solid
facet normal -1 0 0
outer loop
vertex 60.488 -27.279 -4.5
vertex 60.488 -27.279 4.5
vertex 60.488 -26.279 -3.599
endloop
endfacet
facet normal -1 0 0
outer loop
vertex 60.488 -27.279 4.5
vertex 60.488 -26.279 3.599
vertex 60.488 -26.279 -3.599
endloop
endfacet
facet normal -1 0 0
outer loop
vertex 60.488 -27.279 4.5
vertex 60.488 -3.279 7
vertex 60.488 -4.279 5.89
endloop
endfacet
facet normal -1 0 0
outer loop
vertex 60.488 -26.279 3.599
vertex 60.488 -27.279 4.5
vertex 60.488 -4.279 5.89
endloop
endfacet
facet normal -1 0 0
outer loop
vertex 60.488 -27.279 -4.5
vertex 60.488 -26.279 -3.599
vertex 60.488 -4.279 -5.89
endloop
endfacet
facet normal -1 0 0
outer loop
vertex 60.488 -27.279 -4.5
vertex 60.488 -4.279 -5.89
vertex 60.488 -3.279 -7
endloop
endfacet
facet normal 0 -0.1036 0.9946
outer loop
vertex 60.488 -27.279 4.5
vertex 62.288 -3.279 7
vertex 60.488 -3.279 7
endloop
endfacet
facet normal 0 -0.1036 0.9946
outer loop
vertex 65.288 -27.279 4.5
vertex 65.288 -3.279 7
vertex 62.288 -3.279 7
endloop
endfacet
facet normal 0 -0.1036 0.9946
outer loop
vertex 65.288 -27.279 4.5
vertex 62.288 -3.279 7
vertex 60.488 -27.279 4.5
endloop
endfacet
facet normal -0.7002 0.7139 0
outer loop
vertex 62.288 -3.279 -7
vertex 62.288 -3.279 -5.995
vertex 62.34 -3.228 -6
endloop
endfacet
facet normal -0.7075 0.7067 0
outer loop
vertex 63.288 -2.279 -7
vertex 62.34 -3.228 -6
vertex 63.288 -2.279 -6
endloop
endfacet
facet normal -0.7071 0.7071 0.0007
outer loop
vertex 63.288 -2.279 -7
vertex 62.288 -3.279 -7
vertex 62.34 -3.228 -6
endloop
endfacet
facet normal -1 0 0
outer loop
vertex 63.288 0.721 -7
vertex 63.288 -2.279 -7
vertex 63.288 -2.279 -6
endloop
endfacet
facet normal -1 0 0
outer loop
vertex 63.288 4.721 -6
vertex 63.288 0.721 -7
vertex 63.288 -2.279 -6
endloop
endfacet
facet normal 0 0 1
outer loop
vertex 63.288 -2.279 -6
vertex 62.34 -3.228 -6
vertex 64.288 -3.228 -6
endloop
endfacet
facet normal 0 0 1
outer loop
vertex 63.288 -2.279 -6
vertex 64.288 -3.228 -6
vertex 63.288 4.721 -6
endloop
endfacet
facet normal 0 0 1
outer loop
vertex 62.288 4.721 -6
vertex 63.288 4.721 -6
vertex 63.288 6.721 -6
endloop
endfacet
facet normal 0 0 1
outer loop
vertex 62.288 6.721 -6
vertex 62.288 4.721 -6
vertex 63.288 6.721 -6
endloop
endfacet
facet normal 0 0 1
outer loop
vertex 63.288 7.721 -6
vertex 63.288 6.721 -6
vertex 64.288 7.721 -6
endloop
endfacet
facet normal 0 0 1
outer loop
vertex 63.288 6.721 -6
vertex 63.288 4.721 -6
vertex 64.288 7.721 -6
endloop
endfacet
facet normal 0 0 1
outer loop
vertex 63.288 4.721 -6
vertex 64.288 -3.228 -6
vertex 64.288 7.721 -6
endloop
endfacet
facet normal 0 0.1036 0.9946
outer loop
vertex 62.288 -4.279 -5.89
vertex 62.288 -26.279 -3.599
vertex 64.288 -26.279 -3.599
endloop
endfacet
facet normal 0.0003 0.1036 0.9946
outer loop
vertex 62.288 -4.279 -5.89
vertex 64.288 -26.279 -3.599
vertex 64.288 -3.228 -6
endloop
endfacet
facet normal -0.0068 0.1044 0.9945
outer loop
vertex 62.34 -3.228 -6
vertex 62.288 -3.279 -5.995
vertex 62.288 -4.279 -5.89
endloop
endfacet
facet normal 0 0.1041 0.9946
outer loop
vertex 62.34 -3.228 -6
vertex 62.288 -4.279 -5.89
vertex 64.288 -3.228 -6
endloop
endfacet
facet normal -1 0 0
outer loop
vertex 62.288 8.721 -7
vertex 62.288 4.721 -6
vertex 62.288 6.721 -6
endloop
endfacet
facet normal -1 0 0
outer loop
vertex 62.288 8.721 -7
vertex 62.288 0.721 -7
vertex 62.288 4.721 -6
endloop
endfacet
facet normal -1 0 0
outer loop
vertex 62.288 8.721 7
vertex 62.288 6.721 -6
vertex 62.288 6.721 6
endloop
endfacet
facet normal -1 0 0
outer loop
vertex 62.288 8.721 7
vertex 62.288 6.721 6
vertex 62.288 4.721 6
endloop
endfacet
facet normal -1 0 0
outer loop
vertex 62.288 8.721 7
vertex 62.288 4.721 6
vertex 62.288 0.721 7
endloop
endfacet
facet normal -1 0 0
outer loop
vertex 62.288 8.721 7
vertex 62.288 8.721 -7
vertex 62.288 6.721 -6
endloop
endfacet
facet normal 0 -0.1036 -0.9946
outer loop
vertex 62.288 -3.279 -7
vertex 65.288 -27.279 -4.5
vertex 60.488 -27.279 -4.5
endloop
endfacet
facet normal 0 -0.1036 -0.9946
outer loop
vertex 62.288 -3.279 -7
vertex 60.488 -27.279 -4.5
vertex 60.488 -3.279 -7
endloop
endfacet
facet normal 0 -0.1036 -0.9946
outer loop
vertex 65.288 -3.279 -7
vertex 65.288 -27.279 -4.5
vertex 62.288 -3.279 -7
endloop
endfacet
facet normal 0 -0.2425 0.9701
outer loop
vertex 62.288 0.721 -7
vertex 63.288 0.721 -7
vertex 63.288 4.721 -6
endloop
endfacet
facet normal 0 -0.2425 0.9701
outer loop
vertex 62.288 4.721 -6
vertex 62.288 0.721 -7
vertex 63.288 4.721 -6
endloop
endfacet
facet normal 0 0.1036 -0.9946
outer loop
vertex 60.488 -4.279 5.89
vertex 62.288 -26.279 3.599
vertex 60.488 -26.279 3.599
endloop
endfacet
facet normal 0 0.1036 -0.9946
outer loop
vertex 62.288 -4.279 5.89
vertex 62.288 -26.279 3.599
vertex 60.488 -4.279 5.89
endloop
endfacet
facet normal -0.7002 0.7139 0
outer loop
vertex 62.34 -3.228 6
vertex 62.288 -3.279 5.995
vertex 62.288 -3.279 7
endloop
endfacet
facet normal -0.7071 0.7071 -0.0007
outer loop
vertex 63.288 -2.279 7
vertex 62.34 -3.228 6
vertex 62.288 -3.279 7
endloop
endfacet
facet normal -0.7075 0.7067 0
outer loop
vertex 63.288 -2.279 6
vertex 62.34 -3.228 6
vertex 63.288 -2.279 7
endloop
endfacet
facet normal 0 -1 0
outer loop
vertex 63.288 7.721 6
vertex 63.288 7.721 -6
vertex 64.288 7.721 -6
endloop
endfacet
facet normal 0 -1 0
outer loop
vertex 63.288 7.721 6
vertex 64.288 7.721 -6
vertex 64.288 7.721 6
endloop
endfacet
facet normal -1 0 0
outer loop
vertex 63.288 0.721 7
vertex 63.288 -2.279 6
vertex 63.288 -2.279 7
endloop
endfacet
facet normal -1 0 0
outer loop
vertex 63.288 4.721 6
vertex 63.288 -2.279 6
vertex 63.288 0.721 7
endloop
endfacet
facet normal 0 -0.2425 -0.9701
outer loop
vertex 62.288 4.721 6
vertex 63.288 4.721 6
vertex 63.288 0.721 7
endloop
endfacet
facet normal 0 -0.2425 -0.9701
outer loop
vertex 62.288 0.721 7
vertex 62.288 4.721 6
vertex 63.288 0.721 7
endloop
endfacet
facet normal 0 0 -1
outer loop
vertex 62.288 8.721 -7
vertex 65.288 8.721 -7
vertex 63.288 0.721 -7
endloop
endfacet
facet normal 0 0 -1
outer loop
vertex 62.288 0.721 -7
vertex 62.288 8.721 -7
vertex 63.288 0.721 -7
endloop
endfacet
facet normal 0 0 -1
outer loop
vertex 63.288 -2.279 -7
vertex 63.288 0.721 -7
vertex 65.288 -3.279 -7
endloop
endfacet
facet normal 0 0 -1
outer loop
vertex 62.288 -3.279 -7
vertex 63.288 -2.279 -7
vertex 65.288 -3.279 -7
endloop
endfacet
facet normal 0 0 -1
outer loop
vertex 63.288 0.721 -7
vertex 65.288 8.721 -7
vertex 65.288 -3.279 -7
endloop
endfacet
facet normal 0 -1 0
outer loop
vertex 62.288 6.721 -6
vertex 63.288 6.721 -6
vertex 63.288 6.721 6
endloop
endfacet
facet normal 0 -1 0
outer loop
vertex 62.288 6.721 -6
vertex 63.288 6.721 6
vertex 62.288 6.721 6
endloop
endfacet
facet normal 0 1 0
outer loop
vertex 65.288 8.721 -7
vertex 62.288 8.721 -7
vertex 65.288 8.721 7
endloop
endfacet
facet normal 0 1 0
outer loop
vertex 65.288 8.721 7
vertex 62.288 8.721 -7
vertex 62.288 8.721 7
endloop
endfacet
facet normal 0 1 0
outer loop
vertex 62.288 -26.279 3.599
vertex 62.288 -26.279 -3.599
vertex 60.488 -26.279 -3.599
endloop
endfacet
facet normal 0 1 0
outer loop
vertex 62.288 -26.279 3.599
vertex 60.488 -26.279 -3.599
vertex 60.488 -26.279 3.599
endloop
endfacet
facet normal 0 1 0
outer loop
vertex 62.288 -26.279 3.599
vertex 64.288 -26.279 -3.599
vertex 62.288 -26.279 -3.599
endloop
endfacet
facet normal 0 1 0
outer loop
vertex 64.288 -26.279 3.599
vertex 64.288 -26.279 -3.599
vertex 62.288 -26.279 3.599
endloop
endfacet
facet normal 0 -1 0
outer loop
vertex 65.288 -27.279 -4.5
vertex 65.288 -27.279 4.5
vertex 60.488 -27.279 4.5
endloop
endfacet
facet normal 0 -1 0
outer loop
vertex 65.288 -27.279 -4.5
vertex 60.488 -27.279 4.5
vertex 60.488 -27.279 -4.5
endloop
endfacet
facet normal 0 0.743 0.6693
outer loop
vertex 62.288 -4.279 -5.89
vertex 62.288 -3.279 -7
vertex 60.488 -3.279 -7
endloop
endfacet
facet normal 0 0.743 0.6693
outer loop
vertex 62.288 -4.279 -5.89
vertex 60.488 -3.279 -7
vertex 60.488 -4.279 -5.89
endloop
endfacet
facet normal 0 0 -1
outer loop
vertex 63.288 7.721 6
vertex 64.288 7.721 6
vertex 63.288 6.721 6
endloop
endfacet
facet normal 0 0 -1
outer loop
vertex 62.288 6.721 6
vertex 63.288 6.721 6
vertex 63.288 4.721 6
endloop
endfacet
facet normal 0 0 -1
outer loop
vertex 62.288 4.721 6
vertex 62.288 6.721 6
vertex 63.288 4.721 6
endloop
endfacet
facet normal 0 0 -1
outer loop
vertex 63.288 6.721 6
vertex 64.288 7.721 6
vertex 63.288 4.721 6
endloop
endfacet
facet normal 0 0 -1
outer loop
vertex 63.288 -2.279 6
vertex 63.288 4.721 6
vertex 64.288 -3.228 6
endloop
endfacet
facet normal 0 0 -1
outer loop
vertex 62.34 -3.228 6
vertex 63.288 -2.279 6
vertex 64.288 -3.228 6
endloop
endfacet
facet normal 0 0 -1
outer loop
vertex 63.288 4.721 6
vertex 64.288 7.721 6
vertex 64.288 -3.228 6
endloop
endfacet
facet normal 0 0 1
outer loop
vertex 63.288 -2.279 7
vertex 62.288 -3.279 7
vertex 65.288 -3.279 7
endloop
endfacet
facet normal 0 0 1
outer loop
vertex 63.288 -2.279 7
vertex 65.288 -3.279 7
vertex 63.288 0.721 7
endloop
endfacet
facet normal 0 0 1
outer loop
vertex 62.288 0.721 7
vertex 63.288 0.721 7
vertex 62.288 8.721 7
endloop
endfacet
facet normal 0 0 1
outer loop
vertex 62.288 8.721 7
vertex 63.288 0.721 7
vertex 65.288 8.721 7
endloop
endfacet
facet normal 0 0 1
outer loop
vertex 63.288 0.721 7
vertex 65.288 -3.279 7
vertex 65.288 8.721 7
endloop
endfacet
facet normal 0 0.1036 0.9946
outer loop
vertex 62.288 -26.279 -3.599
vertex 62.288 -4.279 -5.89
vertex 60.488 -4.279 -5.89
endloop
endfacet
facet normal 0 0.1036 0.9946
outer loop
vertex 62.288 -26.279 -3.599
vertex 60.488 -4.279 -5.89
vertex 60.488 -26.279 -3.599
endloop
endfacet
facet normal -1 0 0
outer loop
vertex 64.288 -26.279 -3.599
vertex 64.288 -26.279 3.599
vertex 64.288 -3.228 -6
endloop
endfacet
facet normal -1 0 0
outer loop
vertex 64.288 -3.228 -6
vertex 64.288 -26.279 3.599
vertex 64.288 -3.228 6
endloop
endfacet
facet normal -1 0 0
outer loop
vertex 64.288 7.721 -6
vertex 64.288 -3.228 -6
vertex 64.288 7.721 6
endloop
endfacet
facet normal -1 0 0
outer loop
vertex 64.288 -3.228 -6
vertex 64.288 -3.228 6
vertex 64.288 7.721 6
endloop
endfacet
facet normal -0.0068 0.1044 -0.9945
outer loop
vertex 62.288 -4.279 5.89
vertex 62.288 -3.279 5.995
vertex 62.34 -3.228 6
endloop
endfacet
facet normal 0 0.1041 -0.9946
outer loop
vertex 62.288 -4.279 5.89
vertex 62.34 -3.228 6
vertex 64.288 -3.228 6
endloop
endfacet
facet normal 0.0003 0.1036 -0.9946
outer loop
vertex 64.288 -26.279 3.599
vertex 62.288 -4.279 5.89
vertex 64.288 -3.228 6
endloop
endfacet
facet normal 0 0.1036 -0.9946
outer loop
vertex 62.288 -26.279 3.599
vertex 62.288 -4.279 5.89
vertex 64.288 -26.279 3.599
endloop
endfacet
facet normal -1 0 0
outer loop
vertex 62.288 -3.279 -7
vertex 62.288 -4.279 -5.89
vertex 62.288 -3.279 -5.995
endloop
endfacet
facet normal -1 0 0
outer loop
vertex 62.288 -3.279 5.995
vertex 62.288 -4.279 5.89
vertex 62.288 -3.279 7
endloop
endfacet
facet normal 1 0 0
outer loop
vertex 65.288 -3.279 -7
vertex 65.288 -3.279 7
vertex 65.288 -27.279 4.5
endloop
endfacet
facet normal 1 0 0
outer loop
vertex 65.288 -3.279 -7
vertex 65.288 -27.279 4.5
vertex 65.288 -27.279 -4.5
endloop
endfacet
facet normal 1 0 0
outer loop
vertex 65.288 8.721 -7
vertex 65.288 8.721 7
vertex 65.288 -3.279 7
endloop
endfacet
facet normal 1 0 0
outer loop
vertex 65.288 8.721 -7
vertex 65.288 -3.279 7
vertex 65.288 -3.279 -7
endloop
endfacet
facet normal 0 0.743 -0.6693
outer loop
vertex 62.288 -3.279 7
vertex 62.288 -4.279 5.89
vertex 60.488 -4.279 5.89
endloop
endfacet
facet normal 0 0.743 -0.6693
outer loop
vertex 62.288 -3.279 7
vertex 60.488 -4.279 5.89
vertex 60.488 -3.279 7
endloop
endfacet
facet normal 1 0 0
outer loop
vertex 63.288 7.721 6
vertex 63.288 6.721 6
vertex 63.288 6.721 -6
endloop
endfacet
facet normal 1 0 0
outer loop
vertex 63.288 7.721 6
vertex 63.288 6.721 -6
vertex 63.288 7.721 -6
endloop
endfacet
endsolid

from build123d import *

# Parameters (mm, degrees)
EXTRUDE_1_DEPTH          = 2.5
EXTRUDE_1_DEPTH_BACK     = 2.5
SKETCH_1_R               = 2
EXTRUDE_2_DEPTH          = 3
SKETCH_4_W               = 5
SKETCH_4_H               = 21
EXTRUDE_3_DEPTH          = 1.8
CUT_EXTRUDE_1_DEPTH      = 72.103790411
CUT_EXTRUDE_1_DEPTH_BACK = 72.103790411
SHELL_START              = 62.288432405
SHELL_1_DEPTH            = 2
SHELL_START_2            = 63.288432405
SHELL_1_2_OUTLINE_W      = 1
SHELL_1_2_OUTLINE_H      = 12
SHELL_1_2_DEPTH          = 1
EXTRUDE_4_DEPTH          = 1
EXTRUDE_5_DEPTH          = 1.8


with BuildPart() as part:
    # 草图1 → 凸台-拉伸1 (new, two sides: drawn at the far end of the back side and taken through both)
    # profile 1 of 2: a face of its own
    with BuildSketch(Plane.XY.offset(-EXTRUDE_1_DEPTH_BACK)):
        with Locations((54.288432405, 0.720527774)):
            Circle(SKETCH_1_R)
    # profile 2 of 2: a face of its own
    with BuildSketch(Plane.XY.offset(-EXTRUDE_1_DEPTH_BACK)):
        Polygon((54.288432405, 0.720527774), (62.288432405, 0.720527774), (62.288432405, -13.279472226), (62.288432405, -21.279472226), (54.288432405, -13.279472226), align=None)
        Polygon((56.288432405, -12.451045101), (60.288432405, -16.451045101), (60.288432405, -13.279472226), (60.288432405, -1.279472226), (56.288432405, -5.279472226), align=None, mode=Mode.SUBTRACT)
    extrude(amount=EXTRUDE_1_DEPTH + EXTRUDE_1_DEPTH_BACK)

    # 草图2 → 凸台-拉伸2 (add)
    with BuildSketch(Plane(origin=(62.288432405, 0, 0), x_dir=(0, 0, -1), z_dir=(1, 0, 0))):
        Polygon((-7, -3.279472226), (-4.5, -27.279472226), (4.5, -27.279472226), (7, -3.279472226), (7, 8.720527774), (-7, 8.720527774), align=None)
    extrude(amount=EXTRUDE_2_DEPTH)

    # 草图4 → 凸台-拉伸3 (add)
    with BuildSketch(Plane.ZY.offset(-62.288432405)):
        Polygon((-2.5, -0.279472226), (-7, -0.279472226), (-7, -3.279472226), (-4.5, -27.279472226), (4.5, -27.279472226), (7, -3.279472226), (7, -0.279472226), (2.5, -0.279472226), (2.5, -21.279472226), (-2.5, -21.279472226), align=None)
        with Locations((0, -10.779472226)):
            Rectangle(SKETCH_4_W, SKETCH_4_H)
    extrude(amount=EXTRUDE_3_DEPTH)

    # 草图5 → 切除-拉伸1 (cut, two sides: drawn at the far end of the back side and taken through both)
    with BuildSketch(Plane.XY.offset(-CUT_EXTRUDE_1_DEPTH_BACK)):
        Polygon((47.883968073, 6.720527774), (47.883968073, -27.279472226), (62.288432405, -27.279472226), (62.288432405, -3.279472226), (63.288432405, -2.279472226), (63.288432405, 6.720527774), (62.288432405, 6.720527774), align=None)
    extrude(amount=CUT_EXTRUDE_1_DEPTH + CUT_EXTRUDE_1_DEPTH_BACK, mode=Mode.SUBTRACT)

    # 抽壳1: read off the stored shape, not the designer's step
    # 抽壳1 outline → 抽壳1 (cut)
    with BuildSketch(Plane.YZ.offset(SHELL_START)):
        Polygon((6.720527774, -6), (6.720527774, 6), (-3.227529416, 6), (-26.279472226, 3.598755957), (-26.279472226, -3.598755957), (-3.227529416, -6), align=None)
    extrude(amount=SHELL_1_DEPTH, mode=Mode.SUBTRACT)

    # Shell 1 2 outline → Shell 1 2 (cut)
    with BuildSketch(Plane.YZ.offset(SHELL_START_2)):
        with Locations((7.220527774, 0)):
            Rectangle(SHELL_1_2_OUTLINE_W, SHELL_1_2_OUTLINE_H)
    extrude(amount=SHELL_1_2_DEPTH, mode=Mode.SUBTRACT)

    # 草图7 → 凸台-拉伸4 (add)
    with BuildSketch(Plane.ZY.offset(-63.288432405)):
        Polygon((-6, 4.720527774), (-6, 6.720527774), (-7, 6.720527774), (-7, 0.720527774), align=None)
        Polygon((6, 4.720527774), (7, 0.720527774), (7, 6.720527774), (6, 6.720527774), align=None)
    extrude(amount=EXTRUDE_4_DEPTH)

    # 草图6 → 凸台-拉伸5 (add)
    with BuildSketch(Plane.ZY.offset(-62.288432405)):
        Polygon((3.598755957, -26.279472226), (5.890422624, -4.279472226), (7, -3.279472226), (4.5, -27.279472226), (-4.5, -27.279472226), (-7, -3.279472226), (-5.890422624, -4.279472226), (-3.598755957, -26.279472226), align=None)
    extrude(amount=EXTRUDE_5_DEPTH)


solid = part.part
